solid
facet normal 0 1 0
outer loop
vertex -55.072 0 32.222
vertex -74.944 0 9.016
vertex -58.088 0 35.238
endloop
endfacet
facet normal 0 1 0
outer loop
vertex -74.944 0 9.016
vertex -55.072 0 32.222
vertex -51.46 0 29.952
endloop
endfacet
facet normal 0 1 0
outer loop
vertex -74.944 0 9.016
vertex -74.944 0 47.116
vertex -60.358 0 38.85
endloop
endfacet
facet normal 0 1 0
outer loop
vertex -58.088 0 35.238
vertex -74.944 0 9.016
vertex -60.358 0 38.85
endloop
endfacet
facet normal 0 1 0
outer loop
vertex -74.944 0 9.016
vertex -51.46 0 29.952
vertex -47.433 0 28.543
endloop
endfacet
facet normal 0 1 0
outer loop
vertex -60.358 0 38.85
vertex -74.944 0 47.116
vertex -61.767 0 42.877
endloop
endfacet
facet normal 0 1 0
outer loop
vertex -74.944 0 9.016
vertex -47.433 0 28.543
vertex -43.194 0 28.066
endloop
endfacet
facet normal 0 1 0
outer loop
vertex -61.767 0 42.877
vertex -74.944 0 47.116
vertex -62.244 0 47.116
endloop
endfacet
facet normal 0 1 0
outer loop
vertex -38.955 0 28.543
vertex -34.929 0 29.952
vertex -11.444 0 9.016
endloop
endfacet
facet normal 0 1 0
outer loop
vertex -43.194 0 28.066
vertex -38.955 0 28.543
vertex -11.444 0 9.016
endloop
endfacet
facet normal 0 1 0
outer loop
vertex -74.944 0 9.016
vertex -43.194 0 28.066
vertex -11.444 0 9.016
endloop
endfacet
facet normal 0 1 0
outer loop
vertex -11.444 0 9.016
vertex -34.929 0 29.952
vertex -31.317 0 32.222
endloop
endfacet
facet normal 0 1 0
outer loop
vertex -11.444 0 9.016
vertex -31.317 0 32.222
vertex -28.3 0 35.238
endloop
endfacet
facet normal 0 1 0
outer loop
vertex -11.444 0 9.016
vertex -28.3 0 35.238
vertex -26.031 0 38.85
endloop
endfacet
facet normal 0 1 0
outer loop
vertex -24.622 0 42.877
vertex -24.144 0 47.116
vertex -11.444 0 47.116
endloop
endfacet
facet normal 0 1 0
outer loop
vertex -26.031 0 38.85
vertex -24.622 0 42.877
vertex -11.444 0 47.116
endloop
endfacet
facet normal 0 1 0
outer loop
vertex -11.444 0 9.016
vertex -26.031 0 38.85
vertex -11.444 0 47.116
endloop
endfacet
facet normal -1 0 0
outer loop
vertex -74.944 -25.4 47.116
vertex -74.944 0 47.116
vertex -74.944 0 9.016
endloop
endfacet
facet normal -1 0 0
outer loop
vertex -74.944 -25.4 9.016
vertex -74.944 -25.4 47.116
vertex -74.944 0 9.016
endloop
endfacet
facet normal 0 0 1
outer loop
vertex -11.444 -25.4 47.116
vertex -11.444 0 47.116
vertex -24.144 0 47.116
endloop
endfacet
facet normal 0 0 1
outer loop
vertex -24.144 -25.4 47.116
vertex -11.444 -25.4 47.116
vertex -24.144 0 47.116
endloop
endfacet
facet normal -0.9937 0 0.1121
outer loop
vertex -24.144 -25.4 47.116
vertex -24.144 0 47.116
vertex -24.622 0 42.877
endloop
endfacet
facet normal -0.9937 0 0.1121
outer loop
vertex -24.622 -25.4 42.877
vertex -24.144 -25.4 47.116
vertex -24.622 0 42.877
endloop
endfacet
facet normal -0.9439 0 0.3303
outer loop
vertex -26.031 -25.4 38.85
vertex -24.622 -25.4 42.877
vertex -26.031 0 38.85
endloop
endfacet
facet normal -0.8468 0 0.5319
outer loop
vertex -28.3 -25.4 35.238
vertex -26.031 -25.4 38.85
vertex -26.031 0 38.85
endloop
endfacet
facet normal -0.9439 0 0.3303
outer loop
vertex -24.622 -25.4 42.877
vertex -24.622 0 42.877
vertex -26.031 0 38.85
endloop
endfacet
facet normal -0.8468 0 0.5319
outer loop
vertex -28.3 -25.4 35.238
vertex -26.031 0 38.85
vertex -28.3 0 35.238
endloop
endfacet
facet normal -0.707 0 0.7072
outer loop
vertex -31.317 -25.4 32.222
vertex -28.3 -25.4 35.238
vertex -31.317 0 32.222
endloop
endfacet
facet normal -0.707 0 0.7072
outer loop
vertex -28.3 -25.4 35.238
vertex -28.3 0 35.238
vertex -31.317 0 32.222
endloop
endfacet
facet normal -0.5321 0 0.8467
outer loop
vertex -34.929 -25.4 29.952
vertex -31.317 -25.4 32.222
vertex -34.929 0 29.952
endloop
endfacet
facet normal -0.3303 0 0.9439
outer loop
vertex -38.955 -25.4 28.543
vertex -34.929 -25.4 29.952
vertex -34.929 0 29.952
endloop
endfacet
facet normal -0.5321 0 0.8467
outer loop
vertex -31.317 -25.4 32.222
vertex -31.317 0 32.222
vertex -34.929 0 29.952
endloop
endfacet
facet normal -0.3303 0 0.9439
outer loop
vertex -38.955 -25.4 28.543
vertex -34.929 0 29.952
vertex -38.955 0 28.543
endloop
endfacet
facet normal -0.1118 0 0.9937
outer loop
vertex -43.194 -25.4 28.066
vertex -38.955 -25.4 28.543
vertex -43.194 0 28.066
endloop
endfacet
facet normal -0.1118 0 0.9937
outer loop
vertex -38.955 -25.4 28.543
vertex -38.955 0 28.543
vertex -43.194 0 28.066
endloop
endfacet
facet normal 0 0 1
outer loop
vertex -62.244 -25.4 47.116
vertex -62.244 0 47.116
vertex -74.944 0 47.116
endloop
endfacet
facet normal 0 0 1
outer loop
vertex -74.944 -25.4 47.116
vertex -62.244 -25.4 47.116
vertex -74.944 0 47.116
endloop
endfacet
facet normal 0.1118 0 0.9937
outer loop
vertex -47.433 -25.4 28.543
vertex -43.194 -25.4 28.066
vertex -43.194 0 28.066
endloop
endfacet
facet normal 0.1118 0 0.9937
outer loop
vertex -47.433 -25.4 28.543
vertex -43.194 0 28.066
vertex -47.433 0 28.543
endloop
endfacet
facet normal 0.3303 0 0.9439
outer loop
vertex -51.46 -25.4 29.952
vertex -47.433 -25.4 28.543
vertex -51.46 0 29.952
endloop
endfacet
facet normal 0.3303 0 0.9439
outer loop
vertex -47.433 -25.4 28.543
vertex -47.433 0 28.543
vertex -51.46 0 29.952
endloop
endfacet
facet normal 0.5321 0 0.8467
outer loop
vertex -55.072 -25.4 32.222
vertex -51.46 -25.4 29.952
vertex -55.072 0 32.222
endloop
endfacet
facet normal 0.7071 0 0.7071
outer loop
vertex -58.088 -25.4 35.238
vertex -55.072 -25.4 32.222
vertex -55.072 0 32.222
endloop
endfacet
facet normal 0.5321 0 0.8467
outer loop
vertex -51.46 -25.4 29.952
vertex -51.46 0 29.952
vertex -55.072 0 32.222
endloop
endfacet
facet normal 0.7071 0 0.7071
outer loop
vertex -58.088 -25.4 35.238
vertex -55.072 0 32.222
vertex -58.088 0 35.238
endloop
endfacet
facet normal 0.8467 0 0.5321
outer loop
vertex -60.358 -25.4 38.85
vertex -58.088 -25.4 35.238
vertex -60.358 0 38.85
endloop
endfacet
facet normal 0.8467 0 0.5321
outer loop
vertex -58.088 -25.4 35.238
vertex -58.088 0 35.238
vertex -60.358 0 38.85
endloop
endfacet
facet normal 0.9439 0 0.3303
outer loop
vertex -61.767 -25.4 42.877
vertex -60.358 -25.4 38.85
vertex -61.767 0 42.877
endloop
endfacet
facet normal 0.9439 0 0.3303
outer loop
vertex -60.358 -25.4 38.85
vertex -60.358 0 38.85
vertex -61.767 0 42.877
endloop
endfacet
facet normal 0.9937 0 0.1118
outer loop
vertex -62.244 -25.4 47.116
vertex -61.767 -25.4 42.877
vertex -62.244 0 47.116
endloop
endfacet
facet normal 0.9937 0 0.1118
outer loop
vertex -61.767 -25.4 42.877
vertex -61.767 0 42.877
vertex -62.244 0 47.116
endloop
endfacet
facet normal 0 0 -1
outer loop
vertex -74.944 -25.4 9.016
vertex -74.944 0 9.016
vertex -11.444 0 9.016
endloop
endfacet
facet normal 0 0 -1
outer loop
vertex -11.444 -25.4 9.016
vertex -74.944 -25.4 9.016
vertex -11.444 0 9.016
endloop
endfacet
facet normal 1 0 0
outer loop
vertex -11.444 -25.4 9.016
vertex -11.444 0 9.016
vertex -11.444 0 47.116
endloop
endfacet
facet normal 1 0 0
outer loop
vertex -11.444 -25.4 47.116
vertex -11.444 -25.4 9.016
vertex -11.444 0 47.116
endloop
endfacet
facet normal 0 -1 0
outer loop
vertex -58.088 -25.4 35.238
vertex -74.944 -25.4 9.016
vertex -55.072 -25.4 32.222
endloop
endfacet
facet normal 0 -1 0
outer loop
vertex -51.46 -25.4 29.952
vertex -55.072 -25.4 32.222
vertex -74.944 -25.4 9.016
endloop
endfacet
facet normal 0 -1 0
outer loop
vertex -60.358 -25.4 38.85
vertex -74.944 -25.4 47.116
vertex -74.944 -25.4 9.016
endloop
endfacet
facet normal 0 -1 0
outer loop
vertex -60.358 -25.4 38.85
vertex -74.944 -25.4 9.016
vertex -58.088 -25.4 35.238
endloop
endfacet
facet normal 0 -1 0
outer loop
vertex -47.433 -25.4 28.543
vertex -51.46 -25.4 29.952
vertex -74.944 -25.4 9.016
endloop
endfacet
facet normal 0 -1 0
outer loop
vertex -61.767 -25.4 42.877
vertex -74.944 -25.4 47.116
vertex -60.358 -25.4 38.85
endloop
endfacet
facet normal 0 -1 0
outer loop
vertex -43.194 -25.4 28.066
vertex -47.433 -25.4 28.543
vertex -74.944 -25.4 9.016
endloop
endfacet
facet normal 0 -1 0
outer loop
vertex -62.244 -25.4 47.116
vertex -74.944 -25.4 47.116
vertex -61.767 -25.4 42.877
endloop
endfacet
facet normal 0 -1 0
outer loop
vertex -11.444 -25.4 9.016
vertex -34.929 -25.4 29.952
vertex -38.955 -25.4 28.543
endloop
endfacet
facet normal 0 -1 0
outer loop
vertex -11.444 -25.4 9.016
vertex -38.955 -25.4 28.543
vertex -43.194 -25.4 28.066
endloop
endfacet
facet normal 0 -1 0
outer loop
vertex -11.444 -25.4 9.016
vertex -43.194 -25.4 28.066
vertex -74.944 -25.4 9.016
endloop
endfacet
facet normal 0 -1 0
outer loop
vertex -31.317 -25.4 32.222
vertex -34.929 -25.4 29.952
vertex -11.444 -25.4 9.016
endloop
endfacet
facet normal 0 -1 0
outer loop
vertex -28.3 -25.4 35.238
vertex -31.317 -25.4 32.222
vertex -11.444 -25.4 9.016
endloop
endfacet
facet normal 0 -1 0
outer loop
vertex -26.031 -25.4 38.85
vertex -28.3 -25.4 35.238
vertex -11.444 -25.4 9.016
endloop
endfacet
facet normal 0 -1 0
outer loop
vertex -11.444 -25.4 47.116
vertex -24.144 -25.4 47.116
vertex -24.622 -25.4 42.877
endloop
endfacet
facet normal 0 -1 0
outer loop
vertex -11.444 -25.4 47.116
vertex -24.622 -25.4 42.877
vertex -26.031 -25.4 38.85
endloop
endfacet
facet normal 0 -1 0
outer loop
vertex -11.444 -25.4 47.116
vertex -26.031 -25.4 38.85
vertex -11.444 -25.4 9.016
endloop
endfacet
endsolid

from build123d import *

# Parameters (mm, degrees)
F1_DEPTH = 25.4


with BuildPart() as f1:
    # F0 (on Front) → F1 (new body)
    with BuildSketch(Plane.XZ):
        with BuildLine():
            Line((-62.244336, 47.115693), (-74.944336, 47.115693))
            Line((-74.944336, 47.115693), (-74.944336, 9.015693))
            Line((-74.944336, 9.015693), (-43.194336, 9.015693))
            Line((-43.194336, 9.015693), (-43.194336, 28.065693))
            ThreePointArc((-43.194336, 28.065693), (-56.66472, 33.645309), (-62.244336, 47.115693))
        make_face()
        with BuildLine():
            Line((-11.444336, 47.115693), (-24.144336, 47.115693))
            ThreePointArc((-24.144336, 47.115693), (-29.723952, 33.645309), (-43.194336, 28.065693))
            Line((-43.194336, 28.065693), (-43.194336, 9.015693))
            Line((-43.194336, 9.015693), (-11.444336, 9.015693))
            Line((-11.444336, 9.015693), (-11.444336, 47.115693))
        make_face()
    extrude(amount=F1_DEPTH)


solid = f1.part
